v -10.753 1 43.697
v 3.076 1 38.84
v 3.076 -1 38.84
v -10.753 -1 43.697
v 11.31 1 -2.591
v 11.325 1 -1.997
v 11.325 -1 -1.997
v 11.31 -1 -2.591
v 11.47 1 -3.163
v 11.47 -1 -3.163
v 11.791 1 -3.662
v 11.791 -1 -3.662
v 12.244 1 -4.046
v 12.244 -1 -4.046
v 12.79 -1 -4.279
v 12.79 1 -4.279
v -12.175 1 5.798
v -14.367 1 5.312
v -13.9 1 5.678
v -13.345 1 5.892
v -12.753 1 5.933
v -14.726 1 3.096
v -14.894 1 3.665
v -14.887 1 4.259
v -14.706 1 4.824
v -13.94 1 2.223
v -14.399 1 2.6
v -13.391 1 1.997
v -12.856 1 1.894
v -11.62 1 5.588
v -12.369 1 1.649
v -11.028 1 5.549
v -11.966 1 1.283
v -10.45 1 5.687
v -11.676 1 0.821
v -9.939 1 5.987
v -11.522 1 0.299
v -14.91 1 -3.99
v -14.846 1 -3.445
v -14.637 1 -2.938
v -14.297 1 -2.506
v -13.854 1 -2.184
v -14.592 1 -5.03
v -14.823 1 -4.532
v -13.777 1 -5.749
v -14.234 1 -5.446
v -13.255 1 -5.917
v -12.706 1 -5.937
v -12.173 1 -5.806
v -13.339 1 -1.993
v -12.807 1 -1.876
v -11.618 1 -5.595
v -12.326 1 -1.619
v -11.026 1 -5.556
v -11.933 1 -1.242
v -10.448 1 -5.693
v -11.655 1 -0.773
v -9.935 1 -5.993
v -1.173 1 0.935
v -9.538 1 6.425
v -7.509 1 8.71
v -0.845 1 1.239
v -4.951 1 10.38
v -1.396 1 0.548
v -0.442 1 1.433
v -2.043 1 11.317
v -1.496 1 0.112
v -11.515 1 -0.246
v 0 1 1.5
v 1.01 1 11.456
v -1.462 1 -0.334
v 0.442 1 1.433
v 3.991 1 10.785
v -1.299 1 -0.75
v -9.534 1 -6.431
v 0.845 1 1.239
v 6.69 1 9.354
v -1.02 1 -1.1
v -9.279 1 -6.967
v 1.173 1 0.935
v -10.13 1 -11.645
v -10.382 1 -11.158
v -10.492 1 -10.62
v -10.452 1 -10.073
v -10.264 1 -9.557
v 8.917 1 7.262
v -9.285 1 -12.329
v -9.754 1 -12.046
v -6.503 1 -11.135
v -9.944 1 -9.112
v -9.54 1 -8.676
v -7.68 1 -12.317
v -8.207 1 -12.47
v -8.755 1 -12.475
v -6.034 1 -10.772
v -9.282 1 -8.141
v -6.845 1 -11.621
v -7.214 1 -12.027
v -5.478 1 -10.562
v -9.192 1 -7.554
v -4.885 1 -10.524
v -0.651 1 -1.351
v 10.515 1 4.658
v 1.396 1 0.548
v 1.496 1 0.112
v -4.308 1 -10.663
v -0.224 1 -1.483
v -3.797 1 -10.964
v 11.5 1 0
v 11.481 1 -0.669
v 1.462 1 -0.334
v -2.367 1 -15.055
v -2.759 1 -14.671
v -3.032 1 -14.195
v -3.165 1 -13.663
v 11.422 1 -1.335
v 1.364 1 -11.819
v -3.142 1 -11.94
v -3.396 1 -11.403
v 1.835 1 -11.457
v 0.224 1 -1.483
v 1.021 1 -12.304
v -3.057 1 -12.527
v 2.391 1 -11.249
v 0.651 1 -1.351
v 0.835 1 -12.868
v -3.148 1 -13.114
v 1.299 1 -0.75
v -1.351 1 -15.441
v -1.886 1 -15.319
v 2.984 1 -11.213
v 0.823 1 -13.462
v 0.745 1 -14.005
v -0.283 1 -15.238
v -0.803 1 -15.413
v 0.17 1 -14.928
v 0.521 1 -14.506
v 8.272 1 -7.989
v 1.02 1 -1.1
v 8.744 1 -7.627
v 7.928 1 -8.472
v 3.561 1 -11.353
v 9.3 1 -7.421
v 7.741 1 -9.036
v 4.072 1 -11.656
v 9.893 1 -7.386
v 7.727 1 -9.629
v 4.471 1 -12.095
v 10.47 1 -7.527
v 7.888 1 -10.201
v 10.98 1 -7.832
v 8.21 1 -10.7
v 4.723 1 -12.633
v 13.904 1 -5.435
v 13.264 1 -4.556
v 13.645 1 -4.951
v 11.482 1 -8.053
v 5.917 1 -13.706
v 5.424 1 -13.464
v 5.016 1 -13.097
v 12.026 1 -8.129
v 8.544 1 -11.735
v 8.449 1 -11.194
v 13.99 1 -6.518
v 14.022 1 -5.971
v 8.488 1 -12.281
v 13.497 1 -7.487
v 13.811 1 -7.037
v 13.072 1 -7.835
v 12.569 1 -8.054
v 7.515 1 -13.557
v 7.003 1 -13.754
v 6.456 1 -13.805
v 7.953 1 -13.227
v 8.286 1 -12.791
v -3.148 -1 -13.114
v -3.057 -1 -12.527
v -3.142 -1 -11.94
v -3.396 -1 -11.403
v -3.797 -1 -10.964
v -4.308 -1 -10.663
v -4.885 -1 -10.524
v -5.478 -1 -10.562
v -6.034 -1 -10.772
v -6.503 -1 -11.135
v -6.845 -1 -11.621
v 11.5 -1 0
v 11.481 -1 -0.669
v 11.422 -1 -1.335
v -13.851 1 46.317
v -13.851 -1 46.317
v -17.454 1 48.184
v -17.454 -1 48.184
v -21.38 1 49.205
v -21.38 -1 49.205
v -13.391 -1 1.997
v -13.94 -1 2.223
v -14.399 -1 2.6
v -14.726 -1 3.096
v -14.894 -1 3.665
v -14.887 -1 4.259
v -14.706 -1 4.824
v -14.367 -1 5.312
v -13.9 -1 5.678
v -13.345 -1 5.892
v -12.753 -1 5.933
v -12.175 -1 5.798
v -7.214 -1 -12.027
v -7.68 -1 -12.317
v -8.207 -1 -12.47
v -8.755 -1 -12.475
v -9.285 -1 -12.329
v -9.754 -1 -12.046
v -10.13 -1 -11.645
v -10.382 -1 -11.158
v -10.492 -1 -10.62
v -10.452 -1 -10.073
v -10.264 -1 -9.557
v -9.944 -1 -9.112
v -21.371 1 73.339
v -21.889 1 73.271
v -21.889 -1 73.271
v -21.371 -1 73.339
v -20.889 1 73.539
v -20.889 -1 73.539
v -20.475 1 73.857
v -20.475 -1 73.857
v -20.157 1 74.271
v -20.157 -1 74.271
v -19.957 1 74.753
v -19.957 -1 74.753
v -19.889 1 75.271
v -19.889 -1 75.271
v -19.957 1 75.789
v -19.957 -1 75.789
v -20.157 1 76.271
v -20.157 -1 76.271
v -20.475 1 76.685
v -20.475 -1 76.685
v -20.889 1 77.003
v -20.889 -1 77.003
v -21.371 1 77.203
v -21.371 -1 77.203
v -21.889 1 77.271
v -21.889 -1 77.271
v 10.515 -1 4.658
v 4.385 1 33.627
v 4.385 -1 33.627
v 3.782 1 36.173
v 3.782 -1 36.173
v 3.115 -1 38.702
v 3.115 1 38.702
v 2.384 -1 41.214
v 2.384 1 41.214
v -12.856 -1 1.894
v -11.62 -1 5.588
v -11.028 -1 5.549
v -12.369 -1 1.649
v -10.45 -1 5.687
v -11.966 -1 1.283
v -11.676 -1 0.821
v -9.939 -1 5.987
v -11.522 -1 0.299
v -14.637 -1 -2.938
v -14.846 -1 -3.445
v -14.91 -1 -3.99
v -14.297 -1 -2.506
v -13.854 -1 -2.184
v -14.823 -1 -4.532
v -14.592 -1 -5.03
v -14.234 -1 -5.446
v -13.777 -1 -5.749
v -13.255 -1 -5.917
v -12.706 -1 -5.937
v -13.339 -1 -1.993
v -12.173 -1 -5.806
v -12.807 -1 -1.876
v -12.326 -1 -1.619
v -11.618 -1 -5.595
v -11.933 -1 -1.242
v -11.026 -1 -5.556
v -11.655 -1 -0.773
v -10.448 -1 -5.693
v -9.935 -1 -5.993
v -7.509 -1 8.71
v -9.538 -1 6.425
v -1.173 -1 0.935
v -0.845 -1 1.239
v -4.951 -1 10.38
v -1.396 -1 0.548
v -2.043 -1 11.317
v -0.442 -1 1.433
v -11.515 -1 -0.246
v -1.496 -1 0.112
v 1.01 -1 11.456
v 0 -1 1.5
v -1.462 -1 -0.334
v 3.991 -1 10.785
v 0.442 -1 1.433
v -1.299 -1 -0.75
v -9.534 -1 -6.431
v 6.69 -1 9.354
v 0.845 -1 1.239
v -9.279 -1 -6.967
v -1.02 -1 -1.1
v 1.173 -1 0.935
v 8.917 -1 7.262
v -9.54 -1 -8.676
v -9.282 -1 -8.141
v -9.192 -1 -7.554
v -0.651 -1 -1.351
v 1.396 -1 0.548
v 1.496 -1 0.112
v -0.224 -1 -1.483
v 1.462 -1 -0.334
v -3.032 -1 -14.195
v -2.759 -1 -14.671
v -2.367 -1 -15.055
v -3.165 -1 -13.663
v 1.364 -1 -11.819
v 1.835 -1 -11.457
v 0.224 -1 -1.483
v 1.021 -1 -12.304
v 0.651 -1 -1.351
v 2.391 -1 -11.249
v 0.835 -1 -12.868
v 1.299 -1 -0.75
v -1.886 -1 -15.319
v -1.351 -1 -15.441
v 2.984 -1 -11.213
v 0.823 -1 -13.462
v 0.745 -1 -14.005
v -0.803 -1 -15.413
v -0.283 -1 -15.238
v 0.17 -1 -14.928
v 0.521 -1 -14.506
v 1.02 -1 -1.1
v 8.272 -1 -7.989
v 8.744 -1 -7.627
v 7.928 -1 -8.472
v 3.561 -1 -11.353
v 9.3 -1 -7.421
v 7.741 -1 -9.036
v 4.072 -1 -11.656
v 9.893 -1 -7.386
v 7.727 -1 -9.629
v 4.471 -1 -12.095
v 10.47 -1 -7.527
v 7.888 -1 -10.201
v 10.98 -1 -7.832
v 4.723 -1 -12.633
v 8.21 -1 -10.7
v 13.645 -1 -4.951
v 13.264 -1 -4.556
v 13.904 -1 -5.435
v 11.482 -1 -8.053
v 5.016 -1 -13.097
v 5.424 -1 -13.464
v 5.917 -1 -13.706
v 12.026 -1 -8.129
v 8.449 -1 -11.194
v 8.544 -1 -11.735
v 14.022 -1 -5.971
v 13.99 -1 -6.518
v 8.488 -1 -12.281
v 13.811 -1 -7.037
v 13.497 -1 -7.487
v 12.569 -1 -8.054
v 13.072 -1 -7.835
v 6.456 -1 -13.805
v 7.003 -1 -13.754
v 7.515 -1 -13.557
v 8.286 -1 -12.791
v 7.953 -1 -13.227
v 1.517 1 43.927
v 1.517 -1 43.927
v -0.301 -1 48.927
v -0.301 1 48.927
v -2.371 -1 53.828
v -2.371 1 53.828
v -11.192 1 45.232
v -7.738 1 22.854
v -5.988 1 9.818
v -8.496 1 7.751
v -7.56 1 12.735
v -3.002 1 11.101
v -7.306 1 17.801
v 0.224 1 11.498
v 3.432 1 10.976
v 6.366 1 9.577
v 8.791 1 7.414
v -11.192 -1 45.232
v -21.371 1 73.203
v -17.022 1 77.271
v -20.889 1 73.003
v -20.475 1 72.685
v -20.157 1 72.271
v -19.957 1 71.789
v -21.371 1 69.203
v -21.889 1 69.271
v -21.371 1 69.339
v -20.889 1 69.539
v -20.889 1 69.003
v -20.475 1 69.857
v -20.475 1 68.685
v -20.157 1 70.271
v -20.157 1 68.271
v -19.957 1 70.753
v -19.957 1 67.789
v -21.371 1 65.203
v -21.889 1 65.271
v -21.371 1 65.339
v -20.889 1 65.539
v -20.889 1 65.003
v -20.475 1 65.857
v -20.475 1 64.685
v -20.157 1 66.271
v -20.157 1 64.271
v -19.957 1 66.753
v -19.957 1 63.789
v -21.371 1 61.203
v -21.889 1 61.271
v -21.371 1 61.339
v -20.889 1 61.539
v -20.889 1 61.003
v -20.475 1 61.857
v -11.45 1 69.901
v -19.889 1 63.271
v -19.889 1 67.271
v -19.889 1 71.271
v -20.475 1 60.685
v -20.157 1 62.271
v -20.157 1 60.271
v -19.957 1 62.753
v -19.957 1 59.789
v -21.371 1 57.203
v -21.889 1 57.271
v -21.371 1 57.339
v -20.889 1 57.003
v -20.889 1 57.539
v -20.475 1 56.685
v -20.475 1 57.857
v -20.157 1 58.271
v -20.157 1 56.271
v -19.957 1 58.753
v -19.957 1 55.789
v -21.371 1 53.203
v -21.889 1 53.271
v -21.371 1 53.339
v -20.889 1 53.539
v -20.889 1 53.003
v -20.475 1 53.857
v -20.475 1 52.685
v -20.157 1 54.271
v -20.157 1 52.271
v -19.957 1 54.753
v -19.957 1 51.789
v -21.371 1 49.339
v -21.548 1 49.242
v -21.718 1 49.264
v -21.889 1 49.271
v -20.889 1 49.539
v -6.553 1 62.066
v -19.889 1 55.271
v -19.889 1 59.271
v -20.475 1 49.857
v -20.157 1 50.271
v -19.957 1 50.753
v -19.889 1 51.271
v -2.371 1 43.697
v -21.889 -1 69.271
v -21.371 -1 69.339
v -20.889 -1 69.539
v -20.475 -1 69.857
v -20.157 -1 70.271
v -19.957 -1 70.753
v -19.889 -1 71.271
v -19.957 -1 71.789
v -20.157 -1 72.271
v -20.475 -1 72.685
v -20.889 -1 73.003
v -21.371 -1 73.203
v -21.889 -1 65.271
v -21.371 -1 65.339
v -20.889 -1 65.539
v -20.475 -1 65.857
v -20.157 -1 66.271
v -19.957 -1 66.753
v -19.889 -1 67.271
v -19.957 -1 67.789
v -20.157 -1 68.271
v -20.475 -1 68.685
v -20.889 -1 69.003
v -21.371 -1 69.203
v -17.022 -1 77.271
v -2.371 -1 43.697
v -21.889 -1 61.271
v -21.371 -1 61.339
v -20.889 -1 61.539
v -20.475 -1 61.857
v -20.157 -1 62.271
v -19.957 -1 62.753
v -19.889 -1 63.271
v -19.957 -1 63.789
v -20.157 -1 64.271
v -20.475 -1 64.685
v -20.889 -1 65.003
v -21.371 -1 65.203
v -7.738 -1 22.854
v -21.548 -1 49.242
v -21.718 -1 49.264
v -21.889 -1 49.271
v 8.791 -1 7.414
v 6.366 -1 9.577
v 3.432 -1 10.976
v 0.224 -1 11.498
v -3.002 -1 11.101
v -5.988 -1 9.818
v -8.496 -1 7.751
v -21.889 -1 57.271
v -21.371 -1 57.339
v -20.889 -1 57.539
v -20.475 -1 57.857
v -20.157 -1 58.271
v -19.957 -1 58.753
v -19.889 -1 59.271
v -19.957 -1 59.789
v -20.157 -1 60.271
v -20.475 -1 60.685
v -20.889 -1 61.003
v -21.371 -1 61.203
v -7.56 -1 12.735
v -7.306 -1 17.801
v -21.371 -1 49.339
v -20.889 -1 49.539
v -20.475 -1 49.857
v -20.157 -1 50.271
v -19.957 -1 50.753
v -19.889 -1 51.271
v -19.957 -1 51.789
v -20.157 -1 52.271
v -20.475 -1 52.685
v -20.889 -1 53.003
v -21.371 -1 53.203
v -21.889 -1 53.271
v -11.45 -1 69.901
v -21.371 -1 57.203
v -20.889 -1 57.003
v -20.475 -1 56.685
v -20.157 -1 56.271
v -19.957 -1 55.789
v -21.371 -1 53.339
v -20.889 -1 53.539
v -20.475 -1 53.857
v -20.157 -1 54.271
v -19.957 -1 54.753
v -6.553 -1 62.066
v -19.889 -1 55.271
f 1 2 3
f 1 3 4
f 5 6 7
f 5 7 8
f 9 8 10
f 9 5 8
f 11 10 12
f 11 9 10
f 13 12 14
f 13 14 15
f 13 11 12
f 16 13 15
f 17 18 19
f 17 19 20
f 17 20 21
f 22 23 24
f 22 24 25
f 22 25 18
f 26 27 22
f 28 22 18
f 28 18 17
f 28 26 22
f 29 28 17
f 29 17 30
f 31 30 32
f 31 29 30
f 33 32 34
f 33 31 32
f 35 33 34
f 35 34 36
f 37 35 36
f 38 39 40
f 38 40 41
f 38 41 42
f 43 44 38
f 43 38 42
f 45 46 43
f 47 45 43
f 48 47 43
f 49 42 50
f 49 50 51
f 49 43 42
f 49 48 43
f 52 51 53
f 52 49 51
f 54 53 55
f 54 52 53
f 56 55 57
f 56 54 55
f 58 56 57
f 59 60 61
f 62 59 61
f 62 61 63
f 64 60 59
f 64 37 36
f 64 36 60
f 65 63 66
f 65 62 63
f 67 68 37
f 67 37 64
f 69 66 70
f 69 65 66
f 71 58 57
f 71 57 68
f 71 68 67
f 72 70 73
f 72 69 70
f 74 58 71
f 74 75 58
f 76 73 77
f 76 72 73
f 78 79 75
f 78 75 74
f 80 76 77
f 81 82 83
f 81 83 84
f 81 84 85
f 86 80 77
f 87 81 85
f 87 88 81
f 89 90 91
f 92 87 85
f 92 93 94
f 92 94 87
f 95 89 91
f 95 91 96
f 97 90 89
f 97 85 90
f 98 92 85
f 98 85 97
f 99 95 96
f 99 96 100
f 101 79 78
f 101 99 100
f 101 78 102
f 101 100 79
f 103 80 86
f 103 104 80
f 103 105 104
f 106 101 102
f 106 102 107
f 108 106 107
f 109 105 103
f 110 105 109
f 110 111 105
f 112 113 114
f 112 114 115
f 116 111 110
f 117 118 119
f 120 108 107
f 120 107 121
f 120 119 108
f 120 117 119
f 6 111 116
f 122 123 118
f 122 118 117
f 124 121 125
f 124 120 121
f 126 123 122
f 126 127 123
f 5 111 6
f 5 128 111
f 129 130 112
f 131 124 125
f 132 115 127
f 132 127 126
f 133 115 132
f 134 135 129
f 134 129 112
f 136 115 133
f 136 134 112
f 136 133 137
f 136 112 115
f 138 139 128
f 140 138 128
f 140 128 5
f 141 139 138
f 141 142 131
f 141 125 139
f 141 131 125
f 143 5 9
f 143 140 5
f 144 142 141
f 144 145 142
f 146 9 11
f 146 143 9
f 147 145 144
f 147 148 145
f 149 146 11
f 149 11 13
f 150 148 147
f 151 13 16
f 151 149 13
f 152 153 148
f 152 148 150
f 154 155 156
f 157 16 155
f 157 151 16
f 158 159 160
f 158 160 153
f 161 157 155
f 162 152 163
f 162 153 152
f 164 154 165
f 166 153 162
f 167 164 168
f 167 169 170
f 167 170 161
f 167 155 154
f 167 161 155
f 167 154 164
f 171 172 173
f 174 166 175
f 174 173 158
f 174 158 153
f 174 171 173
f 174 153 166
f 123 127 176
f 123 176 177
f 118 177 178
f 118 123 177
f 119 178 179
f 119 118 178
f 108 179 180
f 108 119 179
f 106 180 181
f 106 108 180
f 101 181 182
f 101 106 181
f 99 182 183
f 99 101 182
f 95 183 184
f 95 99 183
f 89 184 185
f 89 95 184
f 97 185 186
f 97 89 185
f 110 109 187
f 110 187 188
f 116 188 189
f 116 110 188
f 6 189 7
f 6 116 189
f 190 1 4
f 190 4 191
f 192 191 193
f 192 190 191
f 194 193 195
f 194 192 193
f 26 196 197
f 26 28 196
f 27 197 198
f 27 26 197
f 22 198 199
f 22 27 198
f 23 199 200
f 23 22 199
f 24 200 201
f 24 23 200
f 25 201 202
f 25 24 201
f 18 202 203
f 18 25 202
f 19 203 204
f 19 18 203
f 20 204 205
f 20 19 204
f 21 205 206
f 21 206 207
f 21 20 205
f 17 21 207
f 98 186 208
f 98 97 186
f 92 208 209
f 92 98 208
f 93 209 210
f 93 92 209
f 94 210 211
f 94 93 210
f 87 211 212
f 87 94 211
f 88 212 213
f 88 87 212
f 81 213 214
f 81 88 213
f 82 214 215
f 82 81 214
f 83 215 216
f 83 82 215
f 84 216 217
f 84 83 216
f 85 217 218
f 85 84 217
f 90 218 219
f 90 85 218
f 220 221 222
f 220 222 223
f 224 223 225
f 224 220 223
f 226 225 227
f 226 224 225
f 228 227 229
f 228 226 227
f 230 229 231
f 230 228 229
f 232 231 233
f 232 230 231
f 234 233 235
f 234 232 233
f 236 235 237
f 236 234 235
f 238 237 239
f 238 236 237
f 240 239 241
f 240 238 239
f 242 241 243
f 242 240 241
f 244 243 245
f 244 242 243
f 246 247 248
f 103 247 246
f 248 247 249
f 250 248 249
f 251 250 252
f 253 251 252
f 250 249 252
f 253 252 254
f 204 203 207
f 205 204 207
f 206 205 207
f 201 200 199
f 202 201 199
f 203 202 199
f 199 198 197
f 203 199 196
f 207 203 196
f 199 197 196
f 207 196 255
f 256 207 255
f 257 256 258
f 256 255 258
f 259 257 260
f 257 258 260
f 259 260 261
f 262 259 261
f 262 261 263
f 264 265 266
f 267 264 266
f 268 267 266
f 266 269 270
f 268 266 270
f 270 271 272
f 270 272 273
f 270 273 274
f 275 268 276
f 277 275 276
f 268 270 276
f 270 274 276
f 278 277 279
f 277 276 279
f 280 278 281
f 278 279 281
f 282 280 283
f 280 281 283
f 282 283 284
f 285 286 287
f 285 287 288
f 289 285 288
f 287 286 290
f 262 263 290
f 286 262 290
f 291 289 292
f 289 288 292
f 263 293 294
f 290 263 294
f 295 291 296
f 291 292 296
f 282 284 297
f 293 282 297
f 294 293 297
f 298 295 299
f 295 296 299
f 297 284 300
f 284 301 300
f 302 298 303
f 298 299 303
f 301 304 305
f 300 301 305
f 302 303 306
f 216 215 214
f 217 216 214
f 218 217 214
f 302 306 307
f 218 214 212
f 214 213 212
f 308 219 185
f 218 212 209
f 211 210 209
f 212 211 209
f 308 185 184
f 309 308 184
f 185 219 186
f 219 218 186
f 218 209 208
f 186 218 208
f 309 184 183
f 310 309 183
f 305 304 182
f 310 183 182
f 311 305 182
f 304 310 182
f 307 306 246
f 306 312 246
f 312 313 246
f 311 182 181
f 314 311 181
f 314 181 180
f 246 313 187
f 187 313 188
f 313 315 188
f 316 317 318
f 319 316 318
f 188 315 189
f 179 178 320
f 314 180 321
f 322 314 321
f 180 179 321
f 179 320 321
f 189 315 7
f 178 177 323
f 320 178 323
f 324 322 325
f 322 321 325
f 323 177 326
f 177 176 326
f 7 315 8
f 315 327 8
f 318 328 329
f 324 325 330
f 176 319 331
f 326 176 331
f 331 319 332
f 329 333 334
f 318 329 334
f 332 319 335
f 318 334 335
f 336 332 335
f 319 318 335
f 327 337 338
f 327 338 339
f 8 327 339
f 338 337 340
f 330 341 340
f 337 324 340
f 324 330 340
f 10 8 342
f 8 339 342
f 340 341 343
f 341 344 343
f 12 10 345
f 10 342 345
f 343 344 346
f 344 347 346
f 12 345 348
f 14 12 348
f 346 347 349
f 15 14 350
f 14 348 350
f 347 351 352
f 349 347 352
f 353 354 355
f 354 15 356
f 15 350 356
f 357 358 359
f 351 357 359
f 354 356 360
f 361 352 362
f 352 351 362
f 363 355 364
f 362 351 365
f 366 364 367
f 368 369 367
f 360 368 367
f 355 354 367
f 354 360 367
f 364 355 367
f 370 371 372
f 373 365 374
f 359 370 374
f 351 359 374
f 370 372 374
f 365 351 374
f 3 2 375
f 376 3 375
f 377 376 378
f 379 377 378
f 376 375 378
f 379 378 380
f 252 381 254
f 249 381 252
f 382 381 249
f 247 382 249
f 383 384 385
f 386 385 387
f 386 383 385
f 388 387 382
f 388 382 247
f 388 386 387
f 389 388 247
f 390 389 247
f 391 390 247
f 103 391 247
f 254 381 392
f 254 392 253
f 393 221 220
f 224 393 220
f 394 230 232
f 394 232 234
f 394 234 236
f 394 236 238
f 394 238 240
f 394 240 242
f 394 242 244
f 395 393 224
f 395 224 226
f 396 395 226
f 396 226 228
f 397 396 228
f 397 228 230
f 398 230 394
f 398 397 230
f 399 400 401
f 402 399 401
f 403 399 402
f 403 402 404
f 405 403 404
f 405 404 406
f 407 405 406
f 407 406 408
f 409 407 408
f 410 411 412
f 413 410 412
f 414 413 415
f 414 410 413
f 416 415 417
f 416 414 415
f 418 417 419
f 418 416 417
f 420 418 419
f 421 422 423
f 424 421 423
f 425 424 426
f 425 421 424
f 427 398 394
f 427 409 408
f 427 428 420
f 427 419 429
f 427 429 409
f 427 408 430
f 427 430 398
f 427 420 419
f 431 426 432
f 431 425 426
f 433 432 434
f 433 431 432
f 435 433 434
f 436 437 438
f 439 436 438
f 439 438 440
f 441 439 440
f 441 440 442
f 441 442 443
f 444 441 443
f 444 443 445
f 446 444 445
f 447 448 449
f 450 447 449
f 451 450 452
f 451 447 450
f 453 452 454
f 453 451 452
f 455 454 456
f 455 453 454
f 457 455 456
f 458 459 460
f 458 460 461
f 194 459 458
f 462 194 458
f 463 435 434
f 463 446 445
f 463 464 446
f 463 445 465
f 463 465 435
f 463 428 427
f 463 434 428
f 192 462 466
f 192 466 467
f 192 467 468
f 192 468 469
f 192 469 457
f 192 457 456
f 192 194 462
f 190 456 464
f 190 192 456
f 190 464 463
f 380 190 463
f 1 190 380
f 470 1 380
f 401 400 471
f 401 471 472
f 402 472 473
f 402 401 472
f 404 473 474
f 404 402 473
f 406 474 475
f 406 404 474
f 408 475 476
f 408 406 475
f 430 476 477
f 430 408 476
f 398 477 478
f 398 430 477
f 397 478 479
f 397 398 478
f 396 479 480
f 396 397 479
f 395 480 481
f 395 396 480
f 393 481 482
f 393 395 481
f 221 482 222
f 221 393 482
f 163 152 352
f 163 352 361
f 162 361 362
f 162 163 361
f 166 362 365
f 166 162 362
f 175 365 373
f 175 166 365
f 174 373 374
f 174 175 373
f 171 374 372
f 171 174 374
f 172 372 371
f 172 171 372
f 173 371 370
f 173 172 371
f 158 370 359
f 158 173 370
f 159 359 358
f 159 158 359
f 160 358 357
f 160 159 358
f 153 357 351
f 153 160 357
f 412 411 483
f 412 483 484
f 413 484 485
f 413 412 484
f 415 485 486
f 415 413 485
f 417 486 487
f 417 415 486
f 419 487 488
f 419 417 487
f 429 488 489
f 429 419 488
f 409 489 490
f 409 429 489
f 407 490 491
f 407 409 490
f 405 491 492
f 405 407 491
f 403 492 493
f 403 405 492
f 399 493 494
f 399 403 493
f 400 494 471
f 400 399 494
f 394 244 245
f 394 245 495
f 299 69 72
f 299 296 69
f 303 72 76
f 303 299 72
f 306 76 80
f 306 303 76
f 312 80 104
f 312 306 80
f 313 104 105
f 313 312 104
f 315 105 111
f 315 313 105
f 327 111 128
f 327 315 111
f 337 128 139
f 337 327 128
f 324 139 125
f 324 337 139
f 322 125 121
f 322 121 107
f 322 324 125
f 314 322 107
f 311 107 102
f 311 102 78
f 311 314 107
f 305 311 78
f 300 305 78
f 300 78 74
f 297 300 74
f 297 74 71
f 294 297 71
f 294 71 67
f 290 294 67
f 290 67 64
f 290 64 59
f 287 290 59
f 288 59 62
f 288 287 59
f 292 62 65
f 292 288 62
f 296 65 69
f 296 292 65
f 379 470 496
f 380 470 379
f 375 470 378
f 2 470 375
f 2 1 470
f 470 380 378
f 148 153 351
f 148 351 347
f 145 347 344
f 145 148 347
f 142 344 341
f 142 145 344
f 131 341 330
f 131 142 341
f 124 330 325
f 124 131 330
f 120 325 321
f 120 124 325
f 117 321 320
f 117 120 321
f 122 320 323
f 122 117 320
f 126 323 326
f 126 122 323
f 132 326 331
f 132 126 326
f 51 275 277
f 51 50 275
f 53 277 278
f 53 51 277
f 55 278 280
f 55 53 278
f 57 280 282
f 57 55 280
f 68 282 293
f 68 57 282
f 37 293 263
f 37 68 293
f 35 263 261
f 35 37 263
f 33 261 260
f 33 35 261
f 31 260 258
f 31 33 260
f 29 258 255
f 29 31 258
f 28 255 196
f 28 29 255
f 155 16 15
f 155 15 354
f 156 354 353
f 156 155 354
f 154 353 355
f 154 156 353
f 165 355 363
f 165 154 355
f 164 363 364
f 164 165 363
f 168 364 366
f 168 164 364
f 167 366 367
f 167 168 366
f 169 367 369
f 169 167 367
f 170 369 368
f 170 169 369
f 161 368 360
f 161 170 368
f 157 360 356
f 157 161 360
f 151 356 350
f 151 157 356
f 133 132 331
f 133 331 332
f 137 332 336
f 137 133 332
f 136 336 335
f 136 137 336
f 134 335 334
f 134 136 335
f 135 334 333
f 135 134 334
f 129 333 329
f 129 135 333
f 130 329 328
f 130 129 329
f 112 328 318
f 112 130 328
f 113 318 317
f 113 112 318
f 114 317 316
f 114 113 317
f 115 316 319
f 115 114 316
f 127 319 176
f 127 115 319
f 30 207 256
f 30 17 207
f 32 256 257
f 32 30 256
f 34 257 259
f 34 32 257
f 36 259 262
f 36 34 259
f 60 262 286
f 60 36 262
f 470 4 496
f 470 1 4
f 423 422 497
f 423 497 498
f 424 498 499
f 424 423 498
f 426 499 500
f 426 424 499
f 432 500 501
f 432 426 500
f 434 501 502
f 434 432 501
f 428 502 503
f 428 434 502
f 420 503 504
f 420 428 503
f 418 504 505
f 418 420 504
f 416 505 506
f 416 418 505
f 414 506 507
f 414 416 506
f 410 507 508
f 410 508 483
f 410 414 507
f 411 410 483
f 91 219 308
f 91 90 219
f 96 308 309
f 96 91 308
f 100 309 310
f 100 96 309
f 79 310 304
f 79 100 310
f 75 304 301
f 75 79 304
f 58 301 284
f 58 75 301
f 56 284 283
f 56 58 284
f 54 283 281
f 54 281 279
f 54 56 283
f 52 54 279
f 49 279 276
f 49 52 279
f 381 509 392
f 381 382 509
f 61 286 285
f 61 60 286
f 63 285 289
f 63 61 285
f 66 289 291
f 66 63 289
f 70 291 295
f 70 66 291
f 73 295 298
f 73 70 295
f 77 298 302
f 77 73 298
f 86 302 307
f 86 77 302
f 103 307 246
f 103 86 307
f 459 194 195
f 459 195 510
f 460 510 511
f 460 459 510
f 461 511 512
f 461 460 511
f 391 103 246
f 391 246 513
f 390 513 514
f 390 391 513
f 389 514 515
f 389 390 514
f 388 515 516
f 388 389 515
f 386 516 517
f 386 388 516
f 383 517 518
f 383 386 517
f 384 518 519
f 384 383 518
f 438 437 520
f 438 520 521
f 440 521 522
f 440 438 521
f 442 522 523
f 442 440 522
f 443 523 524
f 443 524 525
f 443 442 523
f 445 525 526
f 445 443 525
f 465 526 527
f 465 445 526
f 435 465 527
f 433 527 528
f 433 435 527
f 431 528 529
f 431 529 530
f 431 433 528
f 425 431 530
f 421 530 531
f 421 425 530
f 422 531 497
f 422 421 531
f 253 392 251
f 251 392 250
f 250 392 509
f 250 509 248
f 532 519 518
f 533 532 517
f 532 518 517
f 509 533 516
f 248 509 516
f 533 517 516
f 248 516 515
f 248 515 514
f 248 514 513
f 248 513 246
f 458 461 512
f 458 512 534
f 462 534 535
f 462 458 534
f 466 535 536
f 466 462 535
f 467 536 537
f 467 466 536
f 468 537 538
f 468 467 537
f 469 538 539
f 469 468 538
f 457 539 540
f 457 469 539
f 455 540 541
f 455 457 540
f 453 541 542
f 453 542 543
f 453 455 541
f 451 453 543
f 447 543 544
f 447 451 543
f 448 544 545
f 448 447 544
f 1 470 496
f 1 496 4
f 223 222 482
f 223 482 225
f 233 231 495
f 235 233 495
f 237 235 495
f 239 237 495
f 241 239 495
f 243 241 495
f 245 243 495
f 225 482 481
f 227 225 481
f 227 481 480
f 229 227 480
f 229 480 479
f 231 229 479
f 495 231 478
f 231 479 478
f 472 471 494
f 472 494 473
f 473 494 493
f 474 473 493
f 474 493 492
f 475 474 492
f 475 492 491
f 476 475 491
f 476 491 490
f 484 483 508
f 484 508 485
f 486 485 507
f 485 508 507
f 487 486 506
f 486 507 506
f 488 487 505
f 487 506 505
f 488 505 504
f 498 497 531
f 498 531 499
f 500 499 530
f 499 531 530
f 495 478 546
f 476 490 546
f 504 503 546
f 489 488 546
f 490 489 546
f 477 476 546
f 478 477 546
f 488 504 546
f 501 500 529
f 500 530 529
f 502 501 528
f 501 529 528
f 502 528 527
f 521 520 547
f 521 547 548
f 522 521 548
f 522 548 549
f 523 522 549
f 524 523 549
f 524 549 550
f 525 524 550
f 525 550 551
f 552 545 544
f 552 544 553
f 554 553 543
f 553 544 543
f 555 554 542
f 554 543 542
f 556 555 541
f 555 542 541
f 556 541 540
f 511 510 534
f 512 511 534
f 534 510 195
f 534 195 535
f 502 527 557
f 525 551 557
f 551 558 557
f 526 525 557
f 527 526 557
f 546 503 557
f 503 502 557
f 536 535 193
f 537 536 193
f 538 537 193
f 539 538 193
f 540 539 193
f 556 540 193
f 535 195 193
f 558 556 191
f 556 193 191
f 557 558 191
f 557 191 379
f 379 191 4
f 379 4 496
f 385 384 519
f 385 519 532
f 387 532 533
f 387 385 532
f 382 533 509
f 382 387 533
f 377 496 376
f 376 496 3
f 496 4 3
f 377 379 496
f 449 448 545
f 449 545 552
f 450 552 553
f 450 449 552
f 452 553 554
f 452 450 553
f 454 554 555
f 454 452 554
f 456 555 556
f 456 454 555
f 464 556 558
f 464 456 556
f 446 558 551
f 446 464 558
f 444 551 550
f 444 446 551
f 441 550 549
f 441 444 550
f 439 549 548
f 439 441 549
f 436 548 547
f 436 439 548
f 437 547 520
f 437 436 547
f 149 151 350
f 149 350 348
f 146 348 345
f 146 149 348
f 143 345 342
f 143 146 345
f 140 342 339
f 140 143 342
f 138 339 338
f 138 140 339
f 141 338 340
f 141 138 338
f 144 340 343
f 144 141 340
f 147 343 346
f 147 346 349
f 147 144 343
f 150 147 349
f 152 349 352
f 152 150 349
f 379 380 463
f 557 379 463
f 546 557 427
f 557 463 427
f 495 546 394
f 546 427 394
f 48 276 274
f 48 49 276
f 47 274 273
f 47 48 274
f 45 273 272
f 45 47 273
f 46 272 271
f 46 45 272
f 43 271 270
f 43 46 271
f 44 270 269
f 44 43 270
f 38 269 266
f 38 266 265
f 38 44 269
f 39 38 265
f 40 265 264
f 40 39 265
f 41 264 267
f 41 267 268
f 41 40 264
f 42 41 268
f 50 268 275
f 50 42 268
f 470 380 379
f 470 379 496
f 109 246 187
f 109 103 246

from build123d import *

# Parameters (mm, degrees)
SKETCH1_R           = 1.5
BOSS_EXTRUDE3_DEPTH = 1
BOSS_EXTRUDE5_DEPTH = 1
BOSS_EXTRUDE7_DEPTH = 1
BOSS_EXTRUDE8_DEPTH = 1
CUT_EXTRUDE2_DEPTH  = 1


with BuildPart() as part:
    # Sketch1 → Boss-Extrude3 (new, symmetric)
    with BuildSketch(Plane(origin=(0, 0, 0), x_dir=(1, 0, 0), z_dir=(0, 1, 0))):
        with BuildLine():
            Line((10.514574075, -4.657653059), (11.5, 0))
            ThreePointArc((11.5, 0), (11.456239027, 1.002291054), (11.325289155, 1.996954068))
            ThreePointArc((11.325289155, 1.996954068), (11.611650109, 3.42436803), (12.789931133, 4.279451094))
            ThreePointArc((12.789931133, 4.279451094), (13.810601125, 7.036852746), (10.979881559, 7.831873403))
            ThreePointArc((10.979881559, 7.831873403), (8.272407704, 7.98857126), (8.210294777, 10.699864472))
            ThreePointArc((8.210294777, 10.699864472), (7.514549114, 13.556605461), (4.723206327, 12.632789163))
            ThreePointArc((4.723206327, 12.632789163), (2.390984444, 11.248697408), (0.823354571, 13.461728244))
            ThreePointArc((0.823354571, 13.461728244), (-1.350914013, 15.44101782), (-3.148450543, 13.114240322))
            ThreePointArc((-3.148450543, 13.114240322), (-4.307975824, 10.662614328), (-6.845111027, 11.620692539))
            ThreePointArc((-6.845111027, 11.620692539), (-9.754466061, 12.045762403), (-9.943573918, 9.111606762))
            ThreePointArc((-9.943573918, 9.111606762), (-9.533932084, 6.43071839), (-12.173063031, 5.806253224))
            ThreePointArc((-12.173063031, 5.806253224), (-14.822723717, 4.531761423), (-13.338742224, 1.993488382))
            ThreePointArc((-13.338742224, 1.993488382), (-11.500173028, -0.026307423), (-13.391237031, -1.997040464))
            ThreePointArc((-13.391237031, -1.997040464), (-14.817426803, -4.548498719), (-12.174900262, -5.797902564))
            ThreePointArc((-12.174900262, -5.797902564), (-10.733949165, -5.596544571), (-9.537839858, -6.424921076))
            ThreePointArc((-9.537839858, -6.424921076), (1.009609575, -11.455596384), (10.514574075, -4.657653059))
        make_face()
        with Locations(Location((0, 0, 0), (0, 0, 270))):
            Circle(SKETCH1_R, mode=Mode.SUBTRACT)
    extrude(amount=BOSS_EXTRUDE3_DEPTH, both=True)


with BuildPart() as body_2:
    # Sketch1<5> → Boss-Extrude5 (new, symmetric)
    with BuildSketch(Plane(origin=(0, 0, 0), x_dir=(1, 0, 0), z_dir=(0, 1, 0))):
        with BuildLine():
            Line((2.806807826, -41.088702969), (10.514574075, -4.657653059))
            ThreePointArc((10.514574075, -4.657653059), (1.846708509, -11.35075626), (-8.495825279, -7.750545324))
            ThreePointArc((-8.495825279, -7.750545324), (-7.347088724, -15.263704681), (-7.738414168, -22.854094893))
            Line((-7.738414168, -22.854094893), (-11.192007229, -45.231550072))
            Line((-11.192007229, -45.231550072), (2.806807826, -41.088702969))
        make_face()
    extrude(amount=BOSS_EXTRUDE5_DEPTH, both=True)


with BuildPart() as body_3:
    # Sketch2 → Boss-Extrude7 (new, symmetric)
    with BuildSketch(Plane(origin=(0, 0, 0), x_dir=(1, 0, 0), z_dir=(0, 1, 0))):
        with BuildLine():
            Line((-2.371433126, -72.667068493), (-2.371433126, -43.697049279))
            Line((-2.371433126, -43.697049279), (-10.753114724, -43.697049279))
            ThreePointArc((-10.753114724, -43.697049279), (-15.600240159, -47.350930238), (-21.380122364, -49.205231385))
            ThreePointArc((-21.380122364, -49.205231385), (-21.632355968, -49.254495275), (-21.888824426, -49.271007455))
            ThreePointArc((-21.888824426, -49.271007455), (-20.474610864, -49.856793893), (-19.888824426, -51.271007455))
            ThreePointArc((-19.888824426, -51.271007455), (-20.474610864, -52.685221018), (-21.888824426, -53.271007455))
            ThreePointArc((-21.888824426, -53.271007455), (-20.474610864, -53.856793893), (-19.888824426, -55.271007455))
            ThreePointArc((-19.888824426, -55.271007455), (-20.474610866, -56.68522102), (-21.888824433, -57.271007455))
            ThreePointArc((-21.888824433, -57.271007455), (-20.474610866, -57.85679389), (-19.888824426, -59.271007455))
            ThreePointArc((-19.888824426, -59.271007455), (-20.474610864, -60.685221018), (-21.888824426, -61.271007455))
            ThreePointArc((-21.888824426, -61.271007455), (-20.474610864, -61.856793893), (-19.888824426, -63.271007455))
            ThreePointArc((-19.888824426, -63.271007455), (-20.474610864, -64.685221018), (-21.888824426, -65.271007455))
            ThreePointArc((-21.888824426, -65.271007455), (-20.474610864, -65.856793893), (-19.888824426, -67.271007455))
            ThreePointArc((-19.888824426, -67.271007455), (-20.474610864, -68.685221018), (-21.888824426, -69.271007455))
            ThreePointArc((-21.888824426, -69.271007455), (-20.474610864, -69.856793893), (-19.888824426, -71.271007455))
            ThreePointArc((-19.888824426, -71.271007455), (-20.474610864, -72.685221018), (-21.888824426, -73.271007455))
            ThreePointArc((-21.888824426, -73.271007455), (-20.474610864, -73.856793893), (-19.888824426, -75.271007455))
            ThreePointArc((-19.888824426, -75.271007455), (-20.474610864, -76.685221018), (-21.888824426, -77.271007455))
            Line((-21.888824426, -77.271007455), (-12.155084024, -77.271007455))
            ThreePointArc((-12.155084024, -77.271007455), (-6.995429189, -75.538191741), (-2.371433126, -72.667068493))
        make_face()
    extrude(amount=BOSS_EXTRUDE7_DEPTH, both=True)


with BuildPart() as body_4:
    # Sketch2<5> → Boss-Extrude8 (new, symmetric)
    with BuildSketch(Plane(origin=(0, 0, 0), x_dir=(1, 0, 0), z_dir=(0, 1, 0))):
        Polygon((-10.753114724, -43.697049279), (-2.371433126, -43.697049279), (-2.371433126, -72.667068493), (3.384279509, -38.732055606), align=None)
    extrude(amount=BOSS_EXTRUDE8_DEPTH, both=True)


with BuildPart() as cut_extrude2_tool:
    # Sketch3 → Cut-Extrude2 (new, symmetric)
    with BuildSketch(Plane(origin=(0, 0, 0), x_dir=(1, 0, 0), z_dir=(0, 1, 0))):
        with BuildLine():
            Line((-17.021954225, -77.271007455), (4.891566987, -77.271007455))
            Line((4.891566987, -77.271007455), (4.891566987, -31.235009619))
            ThreePointArc((4.891566987, -31.235009619), (-3.20178666, -55.616014274), (-17.021954225, -77.271007455))
        make_face()
    extrude(amount=CUT_EXTRUDE2_DEPTH, both=True)


with BuildPart() as body_2_1:
    add(body_2.part)

    # Cut-Extrude2: cut by cut_extrude2_tool
    add(cut_extrude2_tool.part, mode=Mode.SUBTRACT)


with BuildPart() as body_3_1:
    add(body_3.part)

    # Cut-Extrude2: cut by cut_extrude2_tool
    add(cut_extrude2_tool.part, mode=Mode.SUBTRACT)


with BuildPart() as body_4_1:
    add(body_4.part)

    # Cut-Extrude2: cut by cut_extrude2_tool
    add(cut_extrude2_tool.part, mode=Mode.SUBTRACT)


solid = Compound([part.part, body_2_1.part, body_3_1.part, body_4_1.part])
